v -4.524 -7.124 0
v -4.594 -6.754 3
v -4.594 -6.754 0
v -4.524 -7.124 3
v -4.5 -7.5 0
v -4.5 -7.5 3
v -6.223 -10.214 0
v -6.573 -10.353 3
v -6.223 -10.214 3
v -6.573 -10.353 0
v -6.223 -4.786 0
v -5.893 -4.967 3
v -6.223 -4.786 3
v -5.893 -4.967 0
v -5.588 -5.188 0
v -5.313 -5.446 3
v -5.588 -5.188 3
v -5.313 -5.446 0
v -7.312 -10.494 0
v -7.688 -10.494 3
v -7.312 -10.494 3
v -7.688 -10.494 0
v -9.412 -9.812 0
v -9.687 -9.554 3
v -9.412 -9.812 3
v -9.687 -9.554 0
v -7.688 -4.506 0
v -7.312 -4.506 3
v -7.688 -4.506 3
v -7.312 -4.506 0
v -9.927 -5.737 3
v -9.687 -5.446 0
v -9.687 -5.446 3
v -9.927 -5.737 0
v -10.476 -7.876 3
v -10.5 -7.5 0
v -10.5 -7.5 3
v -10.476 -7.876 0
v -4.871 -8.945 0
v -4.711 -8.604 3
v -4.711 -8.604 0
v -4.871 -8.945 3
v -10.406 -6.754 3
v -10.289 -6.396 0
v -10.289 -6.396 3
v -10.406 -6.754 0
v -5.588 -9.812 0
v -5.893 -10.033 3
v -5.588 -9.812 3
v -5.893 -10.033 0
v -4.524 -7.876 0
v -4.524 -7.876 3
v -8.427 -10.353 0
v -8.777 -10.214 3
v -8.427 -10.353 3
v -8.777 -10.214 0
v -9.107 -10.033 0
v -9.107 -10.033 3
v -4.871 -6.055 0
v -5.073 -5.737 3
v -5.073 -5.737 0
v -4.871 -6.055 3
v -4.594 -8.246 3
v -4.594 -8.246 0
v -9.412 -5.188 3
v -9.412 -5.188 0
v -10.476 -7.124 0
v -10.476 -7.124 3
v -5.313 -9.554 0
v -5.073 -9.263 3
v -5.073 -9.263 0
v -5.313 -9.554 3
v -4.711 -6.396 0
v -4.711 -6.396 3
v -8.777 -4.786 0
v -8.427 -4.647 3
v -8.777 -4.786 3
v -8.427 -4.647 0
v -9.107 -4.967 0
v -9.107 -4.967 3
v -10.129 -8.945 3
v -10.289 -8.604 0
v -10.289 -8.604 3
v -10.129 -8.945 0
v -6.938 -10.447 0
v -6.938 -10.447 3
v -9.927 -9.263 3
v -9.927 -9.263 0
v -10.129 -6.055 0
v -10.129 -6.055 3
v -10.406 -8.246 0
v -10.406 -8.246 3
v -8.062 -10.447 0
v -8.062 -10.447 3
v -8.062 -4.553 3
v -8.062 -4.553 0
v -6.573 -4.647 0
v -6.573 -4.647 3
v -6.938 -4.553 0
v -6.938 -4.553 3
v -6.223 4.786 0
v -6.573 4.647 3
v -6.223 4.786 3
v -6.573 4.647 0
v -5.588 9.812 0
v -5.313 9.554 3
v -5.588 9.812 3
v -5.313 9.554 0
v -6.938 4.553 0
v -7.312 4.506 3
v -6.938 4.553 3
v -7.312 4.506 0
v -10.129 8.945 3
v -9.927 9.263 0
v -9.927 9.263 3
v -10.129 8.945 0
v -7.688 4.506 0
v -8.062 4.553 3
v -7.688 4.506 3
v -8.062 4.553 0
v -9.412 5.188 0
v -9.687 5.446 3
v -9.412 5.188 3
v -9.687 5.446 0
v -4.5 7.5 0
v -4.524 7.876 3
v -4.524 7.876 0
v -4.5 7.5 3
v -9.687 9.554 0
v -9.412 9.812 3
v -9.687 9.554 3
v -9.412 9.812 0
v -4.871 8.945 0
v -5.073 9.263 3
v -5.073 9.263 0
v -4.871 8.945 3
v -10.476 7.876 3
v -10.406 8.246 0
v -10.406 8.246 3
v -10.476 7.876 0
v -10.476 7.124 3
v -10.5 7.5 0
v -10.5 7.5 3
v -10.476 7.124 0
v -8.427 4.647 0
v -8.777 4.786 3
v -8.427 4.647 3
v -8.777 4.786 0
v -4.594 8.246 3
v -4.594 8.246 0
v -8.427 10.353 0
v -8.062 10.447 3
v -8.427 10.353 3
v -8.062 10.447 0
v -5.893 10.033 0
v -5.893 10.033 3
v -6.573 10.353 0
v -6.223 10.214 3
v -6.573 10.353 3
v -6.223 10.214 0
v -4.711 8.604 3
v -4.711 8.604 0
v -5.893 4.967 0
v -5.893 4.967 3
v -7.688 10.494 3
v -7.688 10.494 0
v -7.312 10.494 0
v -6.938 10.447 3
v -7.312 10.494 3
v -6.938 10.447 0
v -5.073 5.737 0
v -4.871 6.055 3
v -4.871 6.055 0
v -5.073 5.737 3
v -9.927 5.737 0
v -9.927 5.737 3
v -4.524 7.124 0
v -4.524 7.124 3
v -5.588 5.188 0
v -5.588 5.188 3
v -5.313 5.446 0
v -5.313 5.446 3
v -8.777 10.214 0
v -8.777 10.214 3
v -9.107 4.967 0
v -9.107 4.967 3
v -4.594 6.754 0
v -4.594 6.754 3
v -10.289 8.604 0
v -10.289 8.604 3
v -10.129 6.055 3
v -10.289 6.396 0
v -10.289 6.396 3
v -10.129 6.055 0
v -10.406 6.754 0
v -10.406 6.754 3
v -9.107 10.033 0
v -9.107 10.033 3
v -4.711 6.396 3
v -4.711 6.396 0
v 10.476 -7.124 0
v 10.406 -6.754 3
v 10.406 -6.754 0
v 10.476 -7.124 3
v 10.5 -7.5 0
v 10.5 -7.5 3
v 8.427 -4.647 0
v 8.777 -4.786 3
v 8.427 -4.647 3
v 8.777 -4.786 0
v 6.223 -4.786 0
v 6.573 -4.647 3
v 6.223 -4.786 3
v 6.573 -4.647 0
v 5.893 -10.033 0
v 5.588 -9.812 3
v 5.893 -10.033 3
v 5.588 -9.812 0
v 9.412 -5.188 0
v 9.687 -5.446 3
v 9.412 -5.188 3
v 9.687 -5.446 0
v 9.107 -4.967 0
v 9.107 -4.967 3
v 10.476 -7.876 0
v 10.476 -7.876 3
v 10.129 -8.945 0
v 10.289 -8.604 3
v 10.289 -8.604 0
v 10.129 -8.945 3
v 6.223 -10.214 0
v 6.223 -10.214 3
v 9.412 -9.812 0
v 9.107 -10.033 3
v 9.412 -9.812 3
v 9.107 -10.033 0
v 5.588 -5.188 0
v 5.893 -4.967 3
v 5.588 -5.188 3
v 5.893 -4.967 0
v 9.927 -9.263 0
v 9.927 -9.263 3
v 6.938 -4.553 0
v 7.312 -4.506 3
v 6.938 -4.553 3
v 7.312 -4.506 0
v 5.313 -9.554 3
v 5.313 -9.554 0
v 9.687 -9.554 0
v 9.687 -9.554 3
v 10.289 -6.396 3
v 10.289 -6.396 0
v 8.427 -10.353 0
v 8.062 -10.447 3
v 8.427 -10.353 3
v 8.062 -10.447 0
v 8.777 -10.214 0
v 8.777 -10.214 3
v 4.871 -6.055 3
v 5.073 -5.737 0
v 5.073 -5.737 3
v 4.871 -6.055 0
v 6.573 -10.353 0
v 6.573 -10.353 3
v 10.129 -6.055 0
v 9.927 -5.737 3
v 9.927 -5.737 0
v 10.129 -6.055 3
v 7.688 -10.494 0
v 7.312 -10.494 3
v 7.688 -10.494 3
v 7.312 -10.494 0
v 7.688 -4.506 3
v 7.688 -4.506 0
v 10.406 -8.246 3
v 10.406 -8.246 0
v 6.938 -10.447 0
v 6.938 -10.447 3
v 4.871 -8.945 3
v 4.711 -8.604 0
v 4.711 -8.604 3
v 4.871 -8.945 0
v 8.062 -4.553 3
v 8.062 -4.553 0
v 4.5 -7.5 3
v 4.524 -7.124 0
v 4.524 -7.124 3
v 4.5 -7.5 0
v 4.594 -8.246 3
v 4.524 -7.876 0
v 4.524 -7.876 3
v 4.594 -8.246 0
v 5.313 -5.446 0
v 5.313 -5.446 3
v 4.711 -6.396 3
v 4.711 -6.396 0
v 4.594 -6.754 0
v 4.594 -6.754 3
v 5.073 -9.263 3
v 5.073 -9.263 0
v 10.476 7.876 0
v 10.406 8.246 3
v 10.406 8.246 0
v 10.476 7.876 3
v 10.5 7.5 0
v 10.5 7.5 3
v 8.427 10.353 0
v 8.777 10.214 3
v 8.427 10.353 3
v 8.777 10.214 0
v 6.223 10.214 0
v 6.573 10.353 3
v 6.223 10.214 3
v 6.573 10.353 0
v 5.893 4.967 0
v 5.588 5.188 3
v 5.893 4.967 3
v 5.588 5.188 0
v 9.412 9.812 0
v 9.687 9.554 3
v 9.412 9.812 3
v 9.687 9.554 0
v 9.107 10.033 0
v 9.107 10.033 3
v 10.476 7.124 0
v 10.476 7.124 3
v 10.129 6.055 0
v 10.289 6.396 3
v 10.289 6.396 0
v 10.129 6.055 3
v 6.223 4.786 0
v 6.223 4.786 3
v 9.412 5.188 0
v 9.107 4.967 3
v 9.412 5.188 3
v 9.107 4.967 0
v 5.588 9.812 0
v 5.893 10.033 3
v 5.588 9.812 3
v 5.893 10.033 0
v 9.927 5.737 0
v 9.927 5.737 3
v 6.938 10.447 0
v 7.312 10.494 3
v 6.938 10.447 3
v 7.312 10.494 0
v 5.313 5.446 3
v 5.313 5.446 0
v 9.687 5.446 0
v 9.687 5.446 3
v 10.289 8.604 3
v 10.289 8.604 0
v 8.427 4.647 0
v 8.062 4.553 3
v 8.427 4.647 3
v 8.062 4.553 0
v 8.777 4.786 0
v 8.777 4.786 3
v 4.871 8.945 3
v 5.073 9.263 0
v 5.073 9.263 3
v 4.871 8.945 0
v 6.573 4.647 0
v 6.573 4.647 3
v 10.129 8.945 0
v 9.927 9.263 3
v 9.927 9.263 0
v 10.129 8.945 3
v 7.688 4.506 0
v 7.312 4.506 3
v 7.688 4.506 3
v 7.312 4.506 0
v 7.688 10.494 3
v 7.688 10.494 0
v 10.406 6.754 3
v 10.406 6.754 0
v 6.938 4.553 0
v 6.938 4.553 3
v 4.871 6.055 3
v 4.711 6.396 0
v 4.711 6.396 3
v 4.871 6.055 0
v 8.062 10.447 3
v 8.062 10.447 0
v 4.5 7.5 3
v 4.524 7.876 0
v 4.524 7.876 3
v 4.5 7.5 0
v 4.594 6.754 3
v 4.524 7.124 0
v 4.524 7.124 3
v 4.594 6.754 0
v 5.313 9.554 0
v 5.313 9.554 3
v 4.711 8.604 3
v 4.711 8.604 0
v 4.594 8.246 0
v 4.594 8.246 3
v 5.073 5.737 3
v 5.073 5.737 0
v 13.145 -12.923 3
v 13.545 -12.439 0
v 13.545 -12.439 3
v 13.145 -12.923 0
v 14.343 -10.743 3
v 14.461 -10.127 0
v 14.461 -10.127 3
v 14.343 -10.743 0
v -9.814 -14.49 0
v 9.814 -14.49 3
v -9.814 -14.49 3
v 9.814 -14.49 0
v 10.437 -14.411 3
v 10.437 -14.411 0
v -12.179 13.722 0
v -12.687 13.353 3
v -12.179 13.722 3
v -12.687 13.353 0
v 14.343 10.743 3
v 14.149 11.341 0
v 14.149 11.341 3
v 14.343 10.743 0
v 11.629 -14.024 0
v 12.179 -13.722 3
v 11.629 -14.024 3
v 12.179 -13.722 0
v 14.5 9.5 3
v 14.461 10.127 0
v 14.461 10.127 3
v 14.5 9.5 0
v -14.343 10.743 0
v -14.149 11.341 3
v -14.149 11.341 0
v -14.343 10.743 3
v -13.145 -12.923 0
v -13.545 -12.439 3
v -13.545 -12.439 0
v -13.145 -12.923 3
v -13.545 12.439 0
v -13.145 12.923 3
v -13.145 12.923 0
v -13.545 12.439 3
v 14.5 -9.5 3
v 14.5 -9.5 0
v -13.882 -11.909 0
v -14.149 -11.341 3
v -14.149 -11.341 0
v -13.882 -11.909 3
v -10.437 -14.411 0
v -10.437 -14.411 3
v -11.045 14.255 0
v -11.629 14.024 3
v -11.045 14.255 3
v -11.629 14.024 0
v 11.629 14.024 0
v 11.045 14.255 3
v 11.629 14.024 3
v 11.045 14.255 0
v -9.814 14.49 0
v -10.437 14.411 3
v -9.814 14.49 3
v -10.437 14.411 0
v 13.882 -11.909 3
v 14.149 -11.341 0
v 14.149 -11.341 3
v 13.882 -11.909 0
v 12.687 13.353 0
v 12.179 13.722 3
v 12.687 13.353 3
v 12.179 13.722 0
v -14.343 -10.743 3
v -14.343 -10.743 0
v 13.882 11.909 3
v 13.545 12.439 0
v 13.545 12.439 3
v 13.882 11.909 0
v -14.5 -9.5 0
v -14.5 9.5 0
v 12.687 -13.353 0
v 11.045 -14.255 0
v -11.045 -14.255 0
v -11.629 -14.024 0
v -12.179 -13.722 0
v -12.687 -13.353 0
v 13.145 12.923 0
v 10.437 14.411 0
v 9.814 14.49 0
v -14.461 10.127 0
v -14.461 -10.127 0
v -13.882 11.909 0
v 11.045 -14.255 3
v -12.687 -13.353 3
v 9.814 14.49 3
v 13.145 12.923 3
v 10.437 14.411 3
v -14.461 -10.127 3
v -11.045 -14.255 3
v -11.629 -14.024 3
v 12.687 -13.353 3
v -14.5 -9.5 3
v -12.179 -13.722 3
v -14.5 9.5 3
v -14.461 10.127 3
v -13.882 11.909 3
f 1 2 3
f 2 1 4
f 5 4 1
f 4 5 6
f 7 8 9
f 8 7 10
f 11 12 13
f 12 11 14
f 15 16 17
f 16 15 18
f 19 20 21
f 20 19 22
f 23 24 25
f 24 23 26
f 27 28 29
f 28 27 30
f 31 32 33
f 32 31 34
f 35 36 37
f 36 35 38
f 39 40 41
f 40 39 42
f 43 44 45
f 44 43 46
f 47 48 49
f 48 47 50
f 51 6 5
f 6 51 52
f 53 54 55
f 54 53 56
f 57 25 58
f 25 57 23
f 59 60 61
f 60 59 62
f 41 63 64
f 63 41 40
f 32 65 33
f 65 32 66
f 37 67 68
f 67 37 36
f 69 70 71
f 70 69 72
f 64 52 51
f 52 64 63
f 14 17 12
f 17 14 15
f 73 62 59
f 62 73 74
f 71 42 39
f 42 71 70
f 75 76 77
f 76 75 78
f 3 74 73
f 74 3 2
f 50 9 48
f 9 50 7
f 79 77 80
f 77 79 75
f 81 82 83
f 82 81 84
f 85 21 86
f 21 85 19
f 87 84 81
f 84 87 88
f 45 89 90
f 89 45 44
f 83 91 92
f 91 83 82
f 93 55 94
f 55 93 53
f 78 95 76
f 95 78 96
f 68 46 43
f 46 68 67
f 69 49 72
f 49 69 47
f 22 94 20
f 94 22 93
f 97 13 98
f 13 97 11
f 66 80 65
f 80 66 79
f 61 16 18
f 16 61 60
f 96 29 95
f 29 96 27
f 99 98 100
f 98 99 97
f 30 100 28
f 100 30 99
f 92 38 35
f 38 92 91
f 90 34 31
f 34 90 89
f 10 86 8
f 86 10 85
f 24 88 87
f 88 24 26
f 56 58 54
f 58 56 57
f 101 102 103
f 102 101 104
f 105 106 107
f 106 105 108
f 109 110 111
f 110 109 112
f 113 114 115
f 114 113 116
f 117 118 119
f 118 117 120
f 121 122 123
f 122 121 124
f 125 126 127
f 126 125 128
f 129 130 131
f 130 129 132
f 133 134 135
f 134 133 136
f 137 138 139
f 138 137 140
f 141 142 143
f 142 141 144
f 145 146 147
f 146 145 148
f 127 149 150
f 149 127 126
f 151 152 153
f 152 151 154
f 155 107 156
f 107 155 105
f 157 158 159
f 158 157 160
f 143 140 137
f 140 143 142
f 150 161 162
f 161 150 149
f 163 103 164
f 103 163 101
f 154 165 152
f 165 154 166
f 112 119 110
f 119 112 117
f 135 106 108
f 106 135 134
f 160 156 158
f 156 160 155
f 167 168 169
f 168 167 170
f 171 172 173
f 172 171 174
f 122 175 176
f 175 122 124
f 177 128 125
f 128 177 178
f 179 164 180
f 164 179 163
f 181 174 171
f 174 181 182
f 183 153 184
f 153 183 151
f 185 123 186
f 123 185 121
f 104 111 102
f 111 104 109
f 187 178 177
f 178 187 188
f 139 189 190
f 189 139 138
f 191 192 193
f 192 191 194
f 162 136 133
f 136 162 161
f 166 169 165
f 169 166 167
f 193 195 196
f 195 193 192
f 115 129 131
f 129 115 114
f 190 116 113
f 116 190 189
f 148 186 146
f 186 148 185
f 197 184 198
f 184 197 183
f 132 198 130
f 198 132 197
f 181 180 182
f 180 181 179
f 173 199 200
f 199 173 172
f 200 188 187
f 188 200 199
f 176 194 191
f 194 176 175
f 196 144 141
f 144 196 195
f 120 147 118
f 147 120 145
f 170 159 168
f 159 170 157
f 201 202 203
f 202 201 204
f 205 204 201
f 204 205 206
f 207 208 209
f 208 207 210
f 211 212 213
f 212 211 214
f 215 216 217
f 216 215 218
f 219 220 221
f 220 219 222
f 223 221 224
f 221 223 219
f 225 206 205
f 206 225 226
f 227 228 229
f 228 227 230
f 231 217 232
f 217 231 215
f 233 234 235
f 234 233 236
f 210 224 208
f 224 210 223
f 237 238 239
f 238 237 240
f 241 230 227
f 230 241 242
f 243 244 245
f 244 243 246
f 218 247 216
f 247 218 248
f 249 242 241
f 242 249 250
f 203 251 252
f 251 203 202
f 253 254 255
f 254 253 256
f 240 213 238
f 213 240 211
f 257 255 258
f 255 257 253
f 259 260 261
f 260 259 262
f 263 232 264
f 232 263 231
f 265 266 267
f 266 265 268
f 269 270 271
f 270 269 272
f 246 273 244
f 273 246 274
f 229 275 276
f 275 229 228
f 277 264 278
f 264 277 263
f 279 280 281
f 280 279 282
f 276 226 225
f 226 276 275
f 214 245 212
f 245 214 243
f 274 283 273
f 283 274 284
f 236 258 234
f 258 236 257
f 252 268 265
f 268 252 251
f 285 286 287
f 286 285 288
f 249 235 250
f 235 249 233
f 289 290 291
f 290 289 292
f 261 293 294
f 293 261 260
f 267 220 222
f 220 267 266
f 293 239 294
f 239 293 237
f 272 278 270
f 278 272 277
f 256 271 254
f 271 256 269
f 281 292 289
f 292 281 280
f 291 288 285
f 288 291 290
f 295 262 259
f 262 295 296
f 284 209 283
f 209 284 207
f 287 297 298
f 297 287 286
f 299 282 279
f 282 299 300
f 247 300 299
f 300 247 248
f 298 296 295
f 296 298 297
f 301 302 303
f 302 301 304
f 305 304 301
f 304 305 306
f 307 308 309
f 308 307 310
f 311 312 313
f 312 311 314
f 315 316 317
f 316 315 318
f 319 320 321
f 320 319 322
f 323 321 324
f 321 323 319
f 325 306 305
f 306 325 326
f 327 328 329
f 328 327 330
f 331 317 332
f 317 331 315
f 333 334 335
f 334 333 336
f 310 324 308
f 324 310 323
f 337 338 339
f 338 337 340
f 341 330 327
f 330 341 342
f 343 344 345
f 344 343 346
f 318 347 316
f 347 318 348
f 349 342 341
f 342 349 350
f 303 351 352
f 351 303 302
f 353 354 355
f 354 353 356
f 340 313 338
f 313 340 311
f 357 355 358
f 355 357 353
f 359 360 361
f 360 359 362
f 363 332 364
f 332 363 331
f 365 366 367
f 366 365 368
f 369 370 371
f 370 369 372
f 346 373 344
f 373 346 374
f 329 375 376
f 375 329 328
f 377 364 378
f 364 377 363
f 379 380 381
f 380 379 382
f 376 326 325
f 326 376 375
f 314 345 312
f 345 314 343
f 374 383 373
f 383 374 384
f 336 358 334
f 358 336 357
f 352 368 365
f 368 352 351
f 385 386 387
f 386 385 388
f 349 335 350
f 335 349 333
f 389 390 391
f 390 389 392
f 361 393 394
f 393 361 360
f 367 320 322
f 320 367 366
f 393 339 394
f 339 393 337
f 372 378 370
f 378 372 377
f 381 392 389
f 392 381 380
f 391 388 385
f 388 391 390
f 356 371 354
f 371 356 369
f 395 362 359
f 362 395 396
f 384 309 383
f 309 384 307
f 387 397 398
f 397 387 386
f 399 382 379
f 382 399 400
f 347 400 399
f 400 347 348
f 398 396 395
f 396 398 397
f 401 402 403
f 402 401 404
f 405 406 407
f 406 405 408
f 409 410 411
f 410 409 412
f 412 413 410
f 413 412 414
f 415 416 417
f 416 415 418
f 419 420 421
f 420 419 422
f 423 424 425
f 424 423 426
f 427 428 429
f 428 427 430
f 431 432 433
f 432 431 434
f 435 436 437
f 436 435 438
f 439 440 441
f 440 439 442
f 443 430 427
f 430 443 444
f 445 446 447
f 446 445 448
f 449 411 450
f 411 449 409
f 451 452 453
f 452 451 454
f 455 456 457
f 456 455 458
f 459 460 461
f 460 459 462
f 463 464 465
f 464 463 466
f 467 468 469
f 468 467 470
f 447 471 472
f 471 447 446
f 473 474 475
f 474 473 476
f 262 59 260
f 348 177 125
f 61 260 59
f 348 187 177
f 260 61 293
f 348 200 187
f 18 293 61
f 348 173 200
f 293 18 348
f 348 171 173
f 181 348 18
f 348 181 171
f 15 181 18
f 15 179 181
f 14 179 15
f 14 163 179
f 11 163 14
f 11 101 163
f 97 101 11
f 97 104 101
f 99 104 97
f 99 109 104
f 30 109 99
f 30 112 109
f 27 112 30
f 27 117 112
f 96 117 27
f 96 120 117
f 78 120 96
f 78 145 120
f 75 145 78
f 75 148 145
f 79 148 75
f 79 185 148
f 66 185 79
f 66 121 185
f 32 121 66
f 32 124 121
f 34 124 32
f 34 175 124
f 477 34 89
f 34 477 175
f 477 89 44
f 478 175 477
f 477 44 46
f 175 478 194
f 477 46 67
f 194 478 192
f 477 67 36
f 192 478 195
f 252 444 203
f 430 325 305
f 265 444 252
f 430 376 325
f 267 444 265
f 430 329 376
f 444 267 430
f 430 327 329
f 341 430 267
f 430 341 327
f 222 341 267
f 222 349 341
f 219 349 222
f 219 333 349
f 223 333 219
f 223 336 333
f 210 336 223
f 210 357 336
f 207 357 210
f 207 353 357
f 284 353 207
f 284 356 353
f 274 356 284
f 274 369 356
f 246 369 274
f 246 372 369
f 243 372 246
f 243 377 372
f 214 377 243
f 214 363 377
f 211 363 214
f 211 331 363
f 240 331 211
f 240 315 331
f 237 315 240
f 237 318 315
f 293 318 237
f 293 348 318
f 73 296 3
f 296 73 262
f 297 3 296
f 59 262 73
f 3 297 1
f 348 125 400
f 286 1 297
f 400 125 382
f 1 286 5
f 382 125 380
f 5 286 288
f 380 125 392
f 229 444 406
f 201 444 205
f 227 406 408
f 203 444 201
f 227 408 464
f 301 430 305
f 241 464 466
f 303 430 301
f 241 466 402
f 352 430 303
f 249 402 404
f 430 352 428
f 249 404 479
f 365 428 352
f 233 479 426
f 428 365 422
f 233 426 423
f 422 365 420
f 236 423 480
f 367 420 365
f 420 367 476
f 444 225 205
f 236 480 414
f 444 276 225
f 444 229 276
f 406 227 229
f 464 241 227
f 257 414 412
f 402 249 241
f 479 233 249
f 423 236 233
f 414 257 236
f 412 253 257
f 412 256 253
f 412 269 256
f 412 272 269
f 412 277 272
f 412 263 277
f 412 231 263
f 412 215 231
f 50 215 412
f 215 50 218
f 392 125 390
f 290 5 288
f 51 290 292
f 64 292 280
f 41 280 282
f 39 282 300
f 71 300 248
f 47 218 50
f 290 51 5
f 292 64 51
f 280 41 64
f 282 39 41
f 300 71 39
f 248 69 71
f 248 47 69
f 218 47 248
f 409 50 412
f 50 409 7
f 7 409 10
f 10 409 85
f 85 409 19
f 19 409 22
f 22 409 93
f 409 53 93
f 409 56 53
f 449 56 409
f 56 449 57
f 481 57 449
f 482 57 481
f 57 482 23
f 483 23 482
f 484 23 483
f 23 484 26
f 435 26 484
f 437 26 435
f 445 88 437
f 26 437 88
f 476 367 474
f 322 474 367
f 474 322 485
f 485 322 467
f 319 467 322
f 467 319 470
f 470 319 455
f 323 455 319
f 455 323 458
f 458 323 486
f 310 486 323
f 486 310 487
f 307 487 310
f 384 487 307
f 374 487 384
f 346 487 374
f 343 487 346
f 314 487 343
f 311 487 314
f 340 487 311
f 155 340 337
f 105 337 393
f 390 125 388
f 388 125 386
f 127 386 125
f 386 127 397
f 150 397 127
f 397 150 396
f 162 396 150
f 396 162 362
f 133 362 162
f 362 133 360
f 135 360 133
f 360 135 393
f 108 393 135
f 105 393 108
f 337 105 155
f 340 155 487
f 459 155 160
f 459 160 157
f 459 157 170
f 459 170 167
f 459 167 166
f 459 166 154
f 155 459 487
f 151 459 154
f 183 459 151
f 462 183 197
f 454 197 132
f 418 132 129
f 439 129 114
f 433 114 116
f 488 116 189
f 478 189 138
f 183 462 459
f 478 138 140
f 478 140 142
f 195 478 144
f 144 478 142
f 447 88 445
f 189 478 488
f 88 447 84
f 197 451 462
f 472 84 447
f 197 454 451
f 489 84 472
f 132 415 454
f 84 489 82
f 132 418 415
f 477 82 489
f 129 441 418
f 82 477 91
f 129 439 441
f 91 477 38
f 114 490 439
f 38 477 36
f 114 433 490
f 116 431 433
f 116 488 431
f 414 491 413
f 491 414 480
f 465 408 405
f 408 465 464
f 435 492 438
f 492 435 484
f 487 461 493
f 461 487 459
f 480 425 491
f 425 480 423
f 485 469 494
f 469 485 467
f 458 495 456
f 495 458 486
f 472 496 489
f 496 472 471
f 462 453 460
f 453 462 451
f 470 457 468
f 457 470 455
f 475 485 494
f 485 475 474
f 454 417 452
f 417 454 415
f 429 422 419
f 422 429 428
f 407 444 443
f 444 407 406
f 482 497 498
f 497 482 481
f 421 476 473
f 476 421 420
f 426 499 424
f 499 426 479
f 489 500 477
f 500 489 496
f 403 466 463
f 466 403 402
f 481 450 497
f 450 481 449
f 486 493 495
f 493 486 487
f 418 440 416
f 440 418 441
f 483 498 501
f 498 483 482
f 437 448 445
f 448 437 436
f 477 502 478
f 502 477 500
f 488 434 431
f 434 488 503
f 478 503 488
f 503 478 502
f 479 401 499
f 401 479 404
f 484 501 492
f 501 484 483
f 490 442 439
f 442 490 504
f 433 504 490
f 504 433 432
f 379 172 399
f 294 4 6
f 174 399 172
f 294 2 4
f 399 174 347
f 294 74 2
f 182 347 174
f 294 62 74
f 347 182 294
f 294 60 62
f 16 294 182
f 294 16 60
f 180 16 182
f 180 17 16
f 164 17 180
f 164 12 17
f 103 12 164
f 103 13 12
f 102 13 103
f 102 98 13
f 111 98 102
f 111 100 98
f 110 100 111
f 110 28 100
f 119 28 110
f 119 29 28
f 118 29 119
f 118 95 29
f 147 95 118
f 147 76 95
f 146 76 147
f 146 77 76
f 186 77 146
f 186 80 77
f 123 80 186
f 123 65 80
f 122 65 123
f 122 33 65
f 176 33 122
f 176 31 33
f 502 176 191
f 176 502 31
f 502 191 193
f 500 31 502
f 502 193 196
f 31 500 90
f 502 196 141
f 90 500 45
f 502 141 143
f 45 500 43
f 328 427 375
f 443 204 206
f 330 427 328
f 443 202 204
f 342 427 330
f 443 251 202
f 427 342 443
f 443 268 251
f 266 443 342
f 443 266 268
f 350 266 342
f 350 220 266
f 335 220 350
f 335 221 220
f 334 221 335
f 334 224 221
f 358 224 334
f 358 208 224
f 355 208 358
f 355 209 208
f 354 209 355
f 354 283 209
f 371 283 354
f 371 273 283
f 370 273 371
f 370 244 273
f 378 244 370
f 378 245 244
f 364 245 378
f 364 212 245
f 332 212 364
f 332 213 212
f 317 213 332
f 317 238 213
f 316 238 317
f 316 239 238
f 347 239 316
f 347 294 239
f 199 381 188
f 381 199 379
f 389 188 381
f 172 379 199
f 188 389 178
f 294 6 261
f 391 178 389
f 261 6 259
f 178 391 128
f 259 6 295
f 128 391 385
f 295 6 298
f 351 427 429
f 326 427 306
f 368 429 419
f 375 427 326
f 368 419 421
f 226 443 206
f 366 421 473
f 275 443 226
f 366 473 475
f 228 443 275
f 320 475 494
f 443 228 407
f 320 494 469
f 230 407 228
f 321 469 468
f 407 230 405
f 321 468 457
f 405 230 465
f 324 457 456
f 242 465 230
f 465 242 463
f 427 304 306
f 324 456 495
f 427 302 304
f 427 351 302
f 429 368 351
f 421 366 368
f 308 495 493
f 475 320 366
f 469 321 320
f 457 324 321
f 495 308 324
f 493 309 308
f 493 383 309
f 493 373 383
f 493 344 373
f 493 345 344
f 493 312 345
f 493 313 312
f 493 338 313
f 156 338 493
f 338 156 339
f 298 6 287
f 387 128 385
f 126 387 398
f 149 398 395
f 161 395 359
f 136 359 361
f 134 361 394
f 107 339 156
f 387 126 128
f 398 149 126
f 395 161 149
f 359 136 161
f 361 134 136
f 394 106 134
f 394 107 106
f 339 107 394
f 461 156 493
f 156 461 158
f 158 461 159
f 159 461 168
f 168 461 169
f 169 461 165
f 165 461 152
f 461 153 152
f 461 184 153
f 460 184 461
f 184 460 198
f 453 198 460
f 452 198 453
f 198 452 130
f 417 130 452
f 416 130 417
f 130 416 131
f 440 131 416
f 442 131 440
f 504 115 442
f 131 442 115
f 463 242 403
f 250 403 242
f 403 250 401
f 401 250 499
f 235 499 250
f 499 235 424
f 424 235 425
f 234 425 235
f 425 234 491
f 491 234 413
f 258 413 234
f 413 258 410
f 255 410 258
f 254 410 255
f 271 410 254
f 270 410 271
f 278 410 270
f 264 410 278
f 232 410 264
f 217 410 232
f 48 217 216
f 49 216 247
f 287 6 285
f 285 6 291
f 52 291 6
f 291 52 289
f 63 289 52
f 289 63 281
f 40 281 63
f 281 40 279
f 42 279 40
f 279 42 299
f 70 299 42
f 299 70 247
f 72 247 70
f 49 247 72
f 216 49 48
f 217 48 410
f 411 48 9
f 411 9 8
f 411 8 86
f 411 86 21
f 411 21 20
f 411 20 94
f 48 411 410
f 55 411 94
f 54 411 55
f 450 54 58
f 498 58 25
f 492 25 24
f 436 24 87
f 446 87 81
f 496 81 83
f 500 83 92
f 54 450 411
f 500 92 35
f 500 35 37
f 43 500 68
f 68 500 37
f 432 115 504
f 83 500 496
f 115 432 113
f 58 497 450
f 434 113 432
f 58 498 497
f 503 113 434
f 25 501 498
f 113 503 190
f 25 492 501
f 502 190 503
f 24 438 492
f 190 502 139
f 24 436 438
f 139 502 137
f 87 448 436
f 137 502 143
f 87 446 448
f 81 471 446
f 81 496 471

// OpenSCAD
// Generated by SolidPython 1.1.3 on 2023-03-12 21:50:49
$fn = 50;


difference() {
	union() {
		translate(v = [0, 0, 0]) {
			rotate(a = [0, 0, 0]) {
				hull() {
					translate(v = [-9.5000000000, 9.5000000000, 0]) {
						rotate(a = [0, 0, 0]) {
							translate(v = [0, 0, 0]) {
								rotate(a = [0, 0, 0]) {
									cylinder(h = 3, r = 5);
								}
							}
						}
					}
					translate(v = [9.5000000000, 9.5000000000, 0]) {
						rotate(a = [0, 0, 0]) {
							translate(v = [0, 0, 0]) {
								rotate(a = [0, 0, 0]) {
									cylinder(h = 3, r = 5);
								}
							}
						}
					}
					translate(v = [-9.5000000000, -9.5000000000, 0]) {
						rotate(a = [0, 0, 0]) {
							translate(v = [0, 0, 0]) {
								rotate(a = [0, 0, 0]) {
									cylinder(h = 3, r = 5);
								}
							}
						}
					}
					translate(v = [9.5000000000, -9.5000000000, 0]) {
						rotate(a = [0, 0, 0]) {
							translate(v = [0, 0, 0]) {
								rotate(a = [0, 0, 0]) {
									cylinder(h = 3, r = 5);
								}
							}
						}
					}
				}
			}
		}
	}
	union() {
		translate(v = [-7.5000000000, -7.5000000000, 0]) {
			rotate(a = [0, 0, 0]) {
				translate(v = [0, 0, -50]) {
					rotate(a = [0, 0, 0]) {
						cylinder(h = 100, r = 3.0000000000);
					}
				}
			}
		}
		translate(v = [-7.5000000000, 7.5000000000, 0]) {
			rotate(a = [0, 0, 0]) {
				translate(v = [0, 0, -50]) {
					rotate(a = [0, 0, 0]) {
						cylinder(h = 100, r = 3.0000000000);
					}
				}
			}
		}
		translate(v = [7.5000000000, -7.5000000000, 0]) {
			rotate(a = [0, 0, 0]) {
				translate(v = [0, 0, -50]) {
					rotate(a = [0, 0, 0]) {
						cylinder(h = 100, r = 3.0000000000);
					}
				}
			}
		}
		translate(v = [7.5000000000, 7.5000000000, 0]) {
			rotate(a = [0, 0, 0]) {
				translate(v = [0, 0, -50]) {
					rotate(a = [0, 0, 0]) {
						cylinder(h = 100, r = 3.0000000000);
					}
				}
			}
		}
	}
}
/***********************************************
*********      SolidPython code:      **********
************************************************
 
from solid import *
import os
import subprocess

import oomB

import opsc_library_gen

mode = "laser"
#mode = "3d_print"

defined_objects = {}

radius_dict = {}
countersunk_dict = {}


def set_mode(m):
    global mode
    mode = m
    radius_dict['M6'] = 6.5/2
    radius_dict['M3'] = 3.3/2
    if mode == "laser":
        radius_dict['M6'] = 6/2
        radius_dict['M3'] = 3/2

    countersunk_dict['M3'] = {}
    countersunk_dict['M3']['little_rad'] = radius_dict['M3']
    countersunk_dict['M3']['big_rad'] = (5.5+0.6)/2
    if mode == "laser":
        countersunk_dict['M3']['big_rad'] = (4.75+0.6)/2
        countersunk_dict['M3']['little_rad'] = (4.75+0.6)/2

    countersunk_dict['M3']['height'] = 1.7


def opsc_make_object(filename, objects, save_type="none",resolution=50, layers = 1, tilediff = 200, mode="laser", overwrite=True):
    if overwrite or not os.path.exists(filename):
        set_mode(mode)
        save_type = save_type.lower()
        os.makedirs(os.path.dirname(filename), exist_ok=True)
        final_object = opsc_get_object(objects, mode = mode)
        # Save the final object to the specified filename    
        scad_render_to_file(final_object, filename, file_header='$fn = %s;' % resolution, include_orig_code=True)
        if mode == "laser":
            filename_laser = filename.replace(".scad","-flat.scad")
            scad_render_to_file(getLaser(final_object, layers=layers, tilediff=tilediff), filename_laser, file_header='$fn = %s;' % resolution, include_orig_code=True)
            if save_type == "all":
                saveToAll(filename_laser)
            elif save_type == "dxf":
                saveToDxf(filename_laser)
        if save_type == "all":
            saveToAll(filename)
        elif save_type == "dxf":
            saveToDxf(filename)


def opsc_get_object(objects, mode = "laser"):
    # Create the solidpython objects only include the positive objects and if they don't have inclusion or their inclusion is either all or mode
    # Initialize an empty list to store the results
    positive_objects = []

    # Iterate over the "objects" list
    for obj in objects:
        # Check if the current object has a "type" key with a value of "positive"
        if obj['type'] == 'positive':
            # Check if the current object has an "inclusion" key and its value matches "mode",
            # or if the current object does not have an "inclusion" key at all
            if not 'inclusion' in obj or obj['inclusion'] == "all" or obj['inclusion'] == mode:
                # Call the "get_opsc_item" function with the current object as an argument
                opsc_item = get_opsc_item(obj)
                # Add the result to the "positive_objects" list
                positive_objects.append(opsc_item)
# Initialize an empty list to store the results
    negative_objects = []

    # Iterate over the "objects" list
    for obj in objects:
        # Check if the current object has a "type" key with a value of "negative"
        if obj['type'] == 'negative':
            # Check if the current object has an "inclusion" key and its value matches "mode",
            # or if the current object does not have an "inclusion" key at all
            if not 'inclusion' in obj or obj['inclusion'] == "all" or obj['inclusion'] == mode:
                # Call the "get_opsc_item" function with the current object as an argument
                opsc_item = get_opsc_item(obj)
                # Add the result to the "negative_objects" list
                negative_objects.append(opsc_item)
    
    #positive_objects = [get_opsc_item(obj) for obj in objects if obj['type'] == 'positive']
    #negative_objects = [get_opsc_item(obj) for obj in objects if obj['type'] == 'negative']
    # Union the positive objects
    positive_object = union()(*positive_objects)
    # Union the negative objects
    negative_object = union()(*negative_objects)
    # Create the final object by subtracting the negative objects from the positive objects
    return difference()(positive_object, negative_object)

def get_opsc_item(params):
    # A dictionary to map radius string values to numerical values
    #radius_dict = {'small': 5, 'medium': 10, 'large': 15}
    # An array of function names for basic shapes
    basic_shapes = ['cube', 'sphere', 'cylinder']
    
    # An array of function names for other shapes
    other_shapes = ['hole', 'slot', 'rounded_rectangle', 'countersunk']
    


    # Convert radius to r if present, and remove radius from the params dictionary
    if 'radius' in params:
        if isinstance(params['radius'], str):
            # Use the radius_dict to map the radius string value to a numerical value
            params['r'] = radius_dict[params['radius']]
        else:
            params['r'] = params['radius']
        del params['radius']
    

    # Check if the object type is a basic shape
    if params['shape'] in basic_shapes:
        # Remove shape and unexpected dictionary values
        allowed_keys = {'size', 'r', 'r1', 'r2', 'd', 'h', 'rw', 'rh', 'dw', 'dh'}
        shape_params = {k: v for k, v in params.items() if k in allowed_keys}

        # Call the corresponding function for the shape parameter, using ** notation to pass the shape_params dictionary as keyword arguments
        return get_opsc_transform(params,globals()[params['shape']](**shape_params))
    
    # If the object type is not a basic shape, check if it's a defined object or one of the other shapes
    elif params['shape'] in other_shapes:
        # Call the corresponding function for the shape parameter, passing the params dictionary as an argument
        p2 = copy.deepcopy(params)
        p2["pos"] = [0,0,0]
        return get_opsc_transform(params,globals()[params['shape']](p2))
    
    # If the object is not a basic shape or a defined object, try to import it from a .scad file
    else:
        obj = defined_objects[params['shape']]
        return get_opsc_transform(params,obj)

def get_opsc_transform(params, solid_obj):
    # Rotate the object based on the 'rot' field in the params dictionary, or the 'rotX', 'rotY', and 'rotZ' fields if 'rot' is not present
    rot = params.get('rot', [])
    if rot:
        rotX, rotY, rotZ = rot
    else:
        rotX = params.get('rotX', 0)
        rotY = params.get('rotY', 0)
        rotZ = params.get('rotZ', 0)
    solid_obj = rotate([rotX, rotY, rotZ])(solid_obj)

    # Translate the object based on the 'pos' field in the params dictionary, or the 'x', 'y', and 'z' fields if 'pos' is not present
    pos = params.get('pos', [])
    if pos:
        x, y, z = pos
    else:
        x = params.get('x', 0)
        y = params.get('y', 0)
        z = params.get('z', 0)
    solid_obj = translate([x, y, z])(solid_obj)
    return solid_obj


import random

def opsc_easy_array(type, shape, repeats, pos_start, shift_arr, **kwargs):
    for i in range(0,3):
        repeats.append(1)
        pos_start.append(0)
        shift_arr.append(0)
    return_objects = []

    for x in range(0,repeats[0]):
        for y in range(0,repeats[1]):
            for z in range(0,repeats[2]):
                return_objects.append(opsc_easy(type, shape, pos=[pos_start[0]+x*shift_arr[0],pos_start[1]+y*shift_arr[1],pos_start[2]+z*shift_arr[2]], **kwargs))
    return return_objects                



def opsc_easy(type, shape, **kwargs):
    obj = {
        'type': type,
        'shape': shape
    }
    for param in ['size', 'r', 'r1', 'r2', 'd', 'h', 'rw', 'rh', 'dw', 'dh', 'pos', 'x', 'y', 'z', 'rot', 'rotX', 'rotY', 'rotZ', "w", "inclusion"]:
        if param in kwargs:
            obj[param] = kwargs[param]
    return obj

def hole(params):
    p2 = copy.deepcopy(params)  
    # Check if the radius is a string and replace it with the corresponding value from the dictionary
    if isinstance(p2['r'], str):
        p2['r'] = radius_dict[p2['r']]
    
    # Set the height to 100 if not specified
    if 'h' not in p2:
        p2['h'] = 100
        p2["pos"] = [0,0,-50]
    p2["center"] = True
    # Create the cylinder object
    p2["shape"] = "cylinder"
    p2["type"] = "positive"

    return get_opsc_item(p2)

import copy

def countersunk(params):
    p2 = copy.deepcopy(params)
    counter_rad = p2['r']
    p2['r'] = radius_dict[p2['r']]
    hp = copy.deepcopy(p2)
    hp["type"] = "positive"
    hp["shape"] = "hole"
    del hp["rot"]
    hol = get_opsc_item(hp)
    
    cp = copy.deepcopy(p2)
    cp["h"] = countersunk_dict[counter_rad]["height"]
    cp["r2"] = countersunk_dict[counter_rad]["little_rad"]
    cp["r1"] = countersunk_dict[counter_rad]["big_rad"]
    del cp["r"]
    del cp["rot"]
    cp["type"] = "positive"
    cp["shape"] = "cylinder"
    cp["pos"] = [0,0,0]

    top = get_opsc_item(cp)
    return union()(hol,top)



def slot(params):  
    p2 = copy.deepcopy(params) 
    if isinstance(p2['r'], str):
        p2['r'] = radius_dict[p2['r']]
    p2["type"] = "positive"
    p2["shape"] = "hole"
    del p2["rot"]
    p2["pos"] = [0,0,0]
    left = copy.deepcopy(p2)
    right = copy.deepcopy(p2)
    left["pos"][0] = p2["w"] / 2 - p2["r"] 
    
    right["pos"][0] = -p2["w"] / 2 + p2["r"] 
    pass
    leftObj = get_opsc_item(left)
    rightObj = get_opsc_item(right)
    return hull()(leftObj, rightObj)

def rounded_rectangle(params):   
    p2 = copy.deepcopy(params) 
    p2["h"] = p2["size"][2]
    p2["pos"] = p2.get("pos", [0, 0, 0]) 
    p2["type"] = "positive"
    p2["shape"] = "hole"
    p2["pos"] = [0,0,0]
    
    if 'rot' in p2:
        del p2["rot"]   
    if 'r' not in p2:
        p2["r"] = 5 
    tl = copy.deepcopy(p2)
    tr = copy.deepcopy(p2)
    bl = copy.deepcopy(p2)
    br = copy.deepcopy(p2)
    tl["pos"][0] = -(p2["size"][0] - p2["r"]*2)/2
    tl["pos"][1] = (p2["size"][1] - p2["r"]*2)/2
    tr["pos"][0] = (p2["size"][0] - p2["r"]*2)/2
    tr["pos"][1] = (p2["size"][1] - p2["r"]*2)/2
    bl["pos"][0] = -(p2["size"][0] - p2["r"]*2)/2
    bl["pos"][1] = -(p2["size"][1] - p2["r"]*2)/2
    br["pos"][0] = (p2["size"][0] - p2["r"]*2)/2
    br["pos"][1] = -(p2["size"][1] - p2["r"]*2)/2
    del tl["size"]
    del tr["size"]
    del bl["size"]
    del br["size"]
    tlo = get_opsc_item(tl)
    tro = get_opsc_item(tr)
    blo = get_opsc_item(bl)
    bro = get_opsc_item(br)    
    return hull()(tlo, tro, blo, bro)



def import_scad_object(filename):
    # Import the .scad file and convert it to a solidpython object
    #filename = "parts"
    obj = import_scad(filename)
    return obj.main()
    


import os
import solid as solidpython

# A dictionary to store the defined objects


def load_scad_objects():
    opsc_library_gen.gen_library(defined_objects)

import random

def test(num_objects):
    objects = []
    for i in range(num_objects):
        # Choose a random shape
        #shape = random.choice(['cube', 'sphere', 'cylinder', 'hole', 'slot', "rounded_rectangle"])
        shape = random.choice(["rounded_rectangle"])

        # Choose a random type
        type = random.choice(['positive', 'negative'])
        
        # Create an empty object dictionary
        obj = {'shape': shape, 'type': type}
        
        # Set shape-specific parameters
        if obj['shape'] in ['cube']:
            obj['size'] =  [random.uniform(5, 15), random.uniform(5, 15), random.uniform(5, 15)]
        if obj['shape'] in ['rounded_rectangle']:
            obj['size'] =  [random.uniform(5, 15), random.uniform(5, 15), random.uniform(5, 15)]
            obj['r'] = random.uniform(0.5, 5)
        elif obj['shape'] == 'sphere':
            obj['r'] = random.uniform(5, 15)
        elif obj['shape'] in ['cylinder', 'hole']:
            obj['r'] = random.uniform(0.5, 5)
            obj['h'] = random.uniform(5, 15)
        elif obj['shape'] == 'slot':
            obj['r'] = random.uniform(0.5, 5)
            obj['h'] = random.uniform(5, 15)
            obj['w'] = random.uniform(5, 15)
        
        # Set a random position and rotation
        obj['pos'] = [random.uniform(-20, 20), random.uniform(-20, 20), random.uniform(-20, 20)]
        obj['rot'] = [random.uniform(-180, 180), random.uniform(-180, 180), random.uniform(-180, 180)]
        
        # Add the object to the list
        objects.append(obj)
    return objects

####### old file saving
def saveToAll(fileIn):
    saveToDxf(fileIn)
    saveToPng(fileIn)
    saveToStl(fileIn)
    saveToSvg(fileIn)

def saveToDxf(fileIn, fileOut="", copy_to_laser=True):
    if fileOut == "":
        fileOut = fileIn.replace(".scad",".dxf")
    saveToFile(fileIn, fileOut)


    
def saveToPng(fileIn, fileOut="",extra="--render"):
    if fileOut == "":
        fileOut = fileIn.replace(".scad",".png")
    saveToFile(fileIn, fileOut)

def saveToStl(fileIn, fileOut=""):
    if fileOut == "":
        fileOut = fileIn.replace(".scad",".stl")
    saveToFile(fileIn, fileOut)
    
def saveToSvg(fileIn, fileOut=""):
    if fileOut == "":
        fileOut = fileIn.replace(".scad",".svg")
    saveToFile(fileIn, fileOut)

def saveToFile(fileIn, fileOut,extra=""):
    #extra = extra + " --colorscheme Tomorrow"

    launchStr = 'openscad -o "' + fileOut + '"' + extra + ' "' + fileIn + '"'
    if ".png" in fileOut:
        launchStr = launchStr + " --render"
    print("            saveToFile launch string: " + launchStr)
    subprocess.run(launchStr)
    x=0

def getLaser(final_object,start=1.5,layers=1,thickness=3,tilediff=200):
        rv= []

        for x in range(layers):
            rv.append(translate([0,x*tilediff,0])(
                    projection()(
                        intersection()(translate([-500,-500,start+x*thickness])(cube(size=[1000,1000,0.1])),
                            final_object
                        )
                    )
            )
            )
            
        return union()(rv)

set_mode("laser")
load_scad_objects() 
 
************************************************/
